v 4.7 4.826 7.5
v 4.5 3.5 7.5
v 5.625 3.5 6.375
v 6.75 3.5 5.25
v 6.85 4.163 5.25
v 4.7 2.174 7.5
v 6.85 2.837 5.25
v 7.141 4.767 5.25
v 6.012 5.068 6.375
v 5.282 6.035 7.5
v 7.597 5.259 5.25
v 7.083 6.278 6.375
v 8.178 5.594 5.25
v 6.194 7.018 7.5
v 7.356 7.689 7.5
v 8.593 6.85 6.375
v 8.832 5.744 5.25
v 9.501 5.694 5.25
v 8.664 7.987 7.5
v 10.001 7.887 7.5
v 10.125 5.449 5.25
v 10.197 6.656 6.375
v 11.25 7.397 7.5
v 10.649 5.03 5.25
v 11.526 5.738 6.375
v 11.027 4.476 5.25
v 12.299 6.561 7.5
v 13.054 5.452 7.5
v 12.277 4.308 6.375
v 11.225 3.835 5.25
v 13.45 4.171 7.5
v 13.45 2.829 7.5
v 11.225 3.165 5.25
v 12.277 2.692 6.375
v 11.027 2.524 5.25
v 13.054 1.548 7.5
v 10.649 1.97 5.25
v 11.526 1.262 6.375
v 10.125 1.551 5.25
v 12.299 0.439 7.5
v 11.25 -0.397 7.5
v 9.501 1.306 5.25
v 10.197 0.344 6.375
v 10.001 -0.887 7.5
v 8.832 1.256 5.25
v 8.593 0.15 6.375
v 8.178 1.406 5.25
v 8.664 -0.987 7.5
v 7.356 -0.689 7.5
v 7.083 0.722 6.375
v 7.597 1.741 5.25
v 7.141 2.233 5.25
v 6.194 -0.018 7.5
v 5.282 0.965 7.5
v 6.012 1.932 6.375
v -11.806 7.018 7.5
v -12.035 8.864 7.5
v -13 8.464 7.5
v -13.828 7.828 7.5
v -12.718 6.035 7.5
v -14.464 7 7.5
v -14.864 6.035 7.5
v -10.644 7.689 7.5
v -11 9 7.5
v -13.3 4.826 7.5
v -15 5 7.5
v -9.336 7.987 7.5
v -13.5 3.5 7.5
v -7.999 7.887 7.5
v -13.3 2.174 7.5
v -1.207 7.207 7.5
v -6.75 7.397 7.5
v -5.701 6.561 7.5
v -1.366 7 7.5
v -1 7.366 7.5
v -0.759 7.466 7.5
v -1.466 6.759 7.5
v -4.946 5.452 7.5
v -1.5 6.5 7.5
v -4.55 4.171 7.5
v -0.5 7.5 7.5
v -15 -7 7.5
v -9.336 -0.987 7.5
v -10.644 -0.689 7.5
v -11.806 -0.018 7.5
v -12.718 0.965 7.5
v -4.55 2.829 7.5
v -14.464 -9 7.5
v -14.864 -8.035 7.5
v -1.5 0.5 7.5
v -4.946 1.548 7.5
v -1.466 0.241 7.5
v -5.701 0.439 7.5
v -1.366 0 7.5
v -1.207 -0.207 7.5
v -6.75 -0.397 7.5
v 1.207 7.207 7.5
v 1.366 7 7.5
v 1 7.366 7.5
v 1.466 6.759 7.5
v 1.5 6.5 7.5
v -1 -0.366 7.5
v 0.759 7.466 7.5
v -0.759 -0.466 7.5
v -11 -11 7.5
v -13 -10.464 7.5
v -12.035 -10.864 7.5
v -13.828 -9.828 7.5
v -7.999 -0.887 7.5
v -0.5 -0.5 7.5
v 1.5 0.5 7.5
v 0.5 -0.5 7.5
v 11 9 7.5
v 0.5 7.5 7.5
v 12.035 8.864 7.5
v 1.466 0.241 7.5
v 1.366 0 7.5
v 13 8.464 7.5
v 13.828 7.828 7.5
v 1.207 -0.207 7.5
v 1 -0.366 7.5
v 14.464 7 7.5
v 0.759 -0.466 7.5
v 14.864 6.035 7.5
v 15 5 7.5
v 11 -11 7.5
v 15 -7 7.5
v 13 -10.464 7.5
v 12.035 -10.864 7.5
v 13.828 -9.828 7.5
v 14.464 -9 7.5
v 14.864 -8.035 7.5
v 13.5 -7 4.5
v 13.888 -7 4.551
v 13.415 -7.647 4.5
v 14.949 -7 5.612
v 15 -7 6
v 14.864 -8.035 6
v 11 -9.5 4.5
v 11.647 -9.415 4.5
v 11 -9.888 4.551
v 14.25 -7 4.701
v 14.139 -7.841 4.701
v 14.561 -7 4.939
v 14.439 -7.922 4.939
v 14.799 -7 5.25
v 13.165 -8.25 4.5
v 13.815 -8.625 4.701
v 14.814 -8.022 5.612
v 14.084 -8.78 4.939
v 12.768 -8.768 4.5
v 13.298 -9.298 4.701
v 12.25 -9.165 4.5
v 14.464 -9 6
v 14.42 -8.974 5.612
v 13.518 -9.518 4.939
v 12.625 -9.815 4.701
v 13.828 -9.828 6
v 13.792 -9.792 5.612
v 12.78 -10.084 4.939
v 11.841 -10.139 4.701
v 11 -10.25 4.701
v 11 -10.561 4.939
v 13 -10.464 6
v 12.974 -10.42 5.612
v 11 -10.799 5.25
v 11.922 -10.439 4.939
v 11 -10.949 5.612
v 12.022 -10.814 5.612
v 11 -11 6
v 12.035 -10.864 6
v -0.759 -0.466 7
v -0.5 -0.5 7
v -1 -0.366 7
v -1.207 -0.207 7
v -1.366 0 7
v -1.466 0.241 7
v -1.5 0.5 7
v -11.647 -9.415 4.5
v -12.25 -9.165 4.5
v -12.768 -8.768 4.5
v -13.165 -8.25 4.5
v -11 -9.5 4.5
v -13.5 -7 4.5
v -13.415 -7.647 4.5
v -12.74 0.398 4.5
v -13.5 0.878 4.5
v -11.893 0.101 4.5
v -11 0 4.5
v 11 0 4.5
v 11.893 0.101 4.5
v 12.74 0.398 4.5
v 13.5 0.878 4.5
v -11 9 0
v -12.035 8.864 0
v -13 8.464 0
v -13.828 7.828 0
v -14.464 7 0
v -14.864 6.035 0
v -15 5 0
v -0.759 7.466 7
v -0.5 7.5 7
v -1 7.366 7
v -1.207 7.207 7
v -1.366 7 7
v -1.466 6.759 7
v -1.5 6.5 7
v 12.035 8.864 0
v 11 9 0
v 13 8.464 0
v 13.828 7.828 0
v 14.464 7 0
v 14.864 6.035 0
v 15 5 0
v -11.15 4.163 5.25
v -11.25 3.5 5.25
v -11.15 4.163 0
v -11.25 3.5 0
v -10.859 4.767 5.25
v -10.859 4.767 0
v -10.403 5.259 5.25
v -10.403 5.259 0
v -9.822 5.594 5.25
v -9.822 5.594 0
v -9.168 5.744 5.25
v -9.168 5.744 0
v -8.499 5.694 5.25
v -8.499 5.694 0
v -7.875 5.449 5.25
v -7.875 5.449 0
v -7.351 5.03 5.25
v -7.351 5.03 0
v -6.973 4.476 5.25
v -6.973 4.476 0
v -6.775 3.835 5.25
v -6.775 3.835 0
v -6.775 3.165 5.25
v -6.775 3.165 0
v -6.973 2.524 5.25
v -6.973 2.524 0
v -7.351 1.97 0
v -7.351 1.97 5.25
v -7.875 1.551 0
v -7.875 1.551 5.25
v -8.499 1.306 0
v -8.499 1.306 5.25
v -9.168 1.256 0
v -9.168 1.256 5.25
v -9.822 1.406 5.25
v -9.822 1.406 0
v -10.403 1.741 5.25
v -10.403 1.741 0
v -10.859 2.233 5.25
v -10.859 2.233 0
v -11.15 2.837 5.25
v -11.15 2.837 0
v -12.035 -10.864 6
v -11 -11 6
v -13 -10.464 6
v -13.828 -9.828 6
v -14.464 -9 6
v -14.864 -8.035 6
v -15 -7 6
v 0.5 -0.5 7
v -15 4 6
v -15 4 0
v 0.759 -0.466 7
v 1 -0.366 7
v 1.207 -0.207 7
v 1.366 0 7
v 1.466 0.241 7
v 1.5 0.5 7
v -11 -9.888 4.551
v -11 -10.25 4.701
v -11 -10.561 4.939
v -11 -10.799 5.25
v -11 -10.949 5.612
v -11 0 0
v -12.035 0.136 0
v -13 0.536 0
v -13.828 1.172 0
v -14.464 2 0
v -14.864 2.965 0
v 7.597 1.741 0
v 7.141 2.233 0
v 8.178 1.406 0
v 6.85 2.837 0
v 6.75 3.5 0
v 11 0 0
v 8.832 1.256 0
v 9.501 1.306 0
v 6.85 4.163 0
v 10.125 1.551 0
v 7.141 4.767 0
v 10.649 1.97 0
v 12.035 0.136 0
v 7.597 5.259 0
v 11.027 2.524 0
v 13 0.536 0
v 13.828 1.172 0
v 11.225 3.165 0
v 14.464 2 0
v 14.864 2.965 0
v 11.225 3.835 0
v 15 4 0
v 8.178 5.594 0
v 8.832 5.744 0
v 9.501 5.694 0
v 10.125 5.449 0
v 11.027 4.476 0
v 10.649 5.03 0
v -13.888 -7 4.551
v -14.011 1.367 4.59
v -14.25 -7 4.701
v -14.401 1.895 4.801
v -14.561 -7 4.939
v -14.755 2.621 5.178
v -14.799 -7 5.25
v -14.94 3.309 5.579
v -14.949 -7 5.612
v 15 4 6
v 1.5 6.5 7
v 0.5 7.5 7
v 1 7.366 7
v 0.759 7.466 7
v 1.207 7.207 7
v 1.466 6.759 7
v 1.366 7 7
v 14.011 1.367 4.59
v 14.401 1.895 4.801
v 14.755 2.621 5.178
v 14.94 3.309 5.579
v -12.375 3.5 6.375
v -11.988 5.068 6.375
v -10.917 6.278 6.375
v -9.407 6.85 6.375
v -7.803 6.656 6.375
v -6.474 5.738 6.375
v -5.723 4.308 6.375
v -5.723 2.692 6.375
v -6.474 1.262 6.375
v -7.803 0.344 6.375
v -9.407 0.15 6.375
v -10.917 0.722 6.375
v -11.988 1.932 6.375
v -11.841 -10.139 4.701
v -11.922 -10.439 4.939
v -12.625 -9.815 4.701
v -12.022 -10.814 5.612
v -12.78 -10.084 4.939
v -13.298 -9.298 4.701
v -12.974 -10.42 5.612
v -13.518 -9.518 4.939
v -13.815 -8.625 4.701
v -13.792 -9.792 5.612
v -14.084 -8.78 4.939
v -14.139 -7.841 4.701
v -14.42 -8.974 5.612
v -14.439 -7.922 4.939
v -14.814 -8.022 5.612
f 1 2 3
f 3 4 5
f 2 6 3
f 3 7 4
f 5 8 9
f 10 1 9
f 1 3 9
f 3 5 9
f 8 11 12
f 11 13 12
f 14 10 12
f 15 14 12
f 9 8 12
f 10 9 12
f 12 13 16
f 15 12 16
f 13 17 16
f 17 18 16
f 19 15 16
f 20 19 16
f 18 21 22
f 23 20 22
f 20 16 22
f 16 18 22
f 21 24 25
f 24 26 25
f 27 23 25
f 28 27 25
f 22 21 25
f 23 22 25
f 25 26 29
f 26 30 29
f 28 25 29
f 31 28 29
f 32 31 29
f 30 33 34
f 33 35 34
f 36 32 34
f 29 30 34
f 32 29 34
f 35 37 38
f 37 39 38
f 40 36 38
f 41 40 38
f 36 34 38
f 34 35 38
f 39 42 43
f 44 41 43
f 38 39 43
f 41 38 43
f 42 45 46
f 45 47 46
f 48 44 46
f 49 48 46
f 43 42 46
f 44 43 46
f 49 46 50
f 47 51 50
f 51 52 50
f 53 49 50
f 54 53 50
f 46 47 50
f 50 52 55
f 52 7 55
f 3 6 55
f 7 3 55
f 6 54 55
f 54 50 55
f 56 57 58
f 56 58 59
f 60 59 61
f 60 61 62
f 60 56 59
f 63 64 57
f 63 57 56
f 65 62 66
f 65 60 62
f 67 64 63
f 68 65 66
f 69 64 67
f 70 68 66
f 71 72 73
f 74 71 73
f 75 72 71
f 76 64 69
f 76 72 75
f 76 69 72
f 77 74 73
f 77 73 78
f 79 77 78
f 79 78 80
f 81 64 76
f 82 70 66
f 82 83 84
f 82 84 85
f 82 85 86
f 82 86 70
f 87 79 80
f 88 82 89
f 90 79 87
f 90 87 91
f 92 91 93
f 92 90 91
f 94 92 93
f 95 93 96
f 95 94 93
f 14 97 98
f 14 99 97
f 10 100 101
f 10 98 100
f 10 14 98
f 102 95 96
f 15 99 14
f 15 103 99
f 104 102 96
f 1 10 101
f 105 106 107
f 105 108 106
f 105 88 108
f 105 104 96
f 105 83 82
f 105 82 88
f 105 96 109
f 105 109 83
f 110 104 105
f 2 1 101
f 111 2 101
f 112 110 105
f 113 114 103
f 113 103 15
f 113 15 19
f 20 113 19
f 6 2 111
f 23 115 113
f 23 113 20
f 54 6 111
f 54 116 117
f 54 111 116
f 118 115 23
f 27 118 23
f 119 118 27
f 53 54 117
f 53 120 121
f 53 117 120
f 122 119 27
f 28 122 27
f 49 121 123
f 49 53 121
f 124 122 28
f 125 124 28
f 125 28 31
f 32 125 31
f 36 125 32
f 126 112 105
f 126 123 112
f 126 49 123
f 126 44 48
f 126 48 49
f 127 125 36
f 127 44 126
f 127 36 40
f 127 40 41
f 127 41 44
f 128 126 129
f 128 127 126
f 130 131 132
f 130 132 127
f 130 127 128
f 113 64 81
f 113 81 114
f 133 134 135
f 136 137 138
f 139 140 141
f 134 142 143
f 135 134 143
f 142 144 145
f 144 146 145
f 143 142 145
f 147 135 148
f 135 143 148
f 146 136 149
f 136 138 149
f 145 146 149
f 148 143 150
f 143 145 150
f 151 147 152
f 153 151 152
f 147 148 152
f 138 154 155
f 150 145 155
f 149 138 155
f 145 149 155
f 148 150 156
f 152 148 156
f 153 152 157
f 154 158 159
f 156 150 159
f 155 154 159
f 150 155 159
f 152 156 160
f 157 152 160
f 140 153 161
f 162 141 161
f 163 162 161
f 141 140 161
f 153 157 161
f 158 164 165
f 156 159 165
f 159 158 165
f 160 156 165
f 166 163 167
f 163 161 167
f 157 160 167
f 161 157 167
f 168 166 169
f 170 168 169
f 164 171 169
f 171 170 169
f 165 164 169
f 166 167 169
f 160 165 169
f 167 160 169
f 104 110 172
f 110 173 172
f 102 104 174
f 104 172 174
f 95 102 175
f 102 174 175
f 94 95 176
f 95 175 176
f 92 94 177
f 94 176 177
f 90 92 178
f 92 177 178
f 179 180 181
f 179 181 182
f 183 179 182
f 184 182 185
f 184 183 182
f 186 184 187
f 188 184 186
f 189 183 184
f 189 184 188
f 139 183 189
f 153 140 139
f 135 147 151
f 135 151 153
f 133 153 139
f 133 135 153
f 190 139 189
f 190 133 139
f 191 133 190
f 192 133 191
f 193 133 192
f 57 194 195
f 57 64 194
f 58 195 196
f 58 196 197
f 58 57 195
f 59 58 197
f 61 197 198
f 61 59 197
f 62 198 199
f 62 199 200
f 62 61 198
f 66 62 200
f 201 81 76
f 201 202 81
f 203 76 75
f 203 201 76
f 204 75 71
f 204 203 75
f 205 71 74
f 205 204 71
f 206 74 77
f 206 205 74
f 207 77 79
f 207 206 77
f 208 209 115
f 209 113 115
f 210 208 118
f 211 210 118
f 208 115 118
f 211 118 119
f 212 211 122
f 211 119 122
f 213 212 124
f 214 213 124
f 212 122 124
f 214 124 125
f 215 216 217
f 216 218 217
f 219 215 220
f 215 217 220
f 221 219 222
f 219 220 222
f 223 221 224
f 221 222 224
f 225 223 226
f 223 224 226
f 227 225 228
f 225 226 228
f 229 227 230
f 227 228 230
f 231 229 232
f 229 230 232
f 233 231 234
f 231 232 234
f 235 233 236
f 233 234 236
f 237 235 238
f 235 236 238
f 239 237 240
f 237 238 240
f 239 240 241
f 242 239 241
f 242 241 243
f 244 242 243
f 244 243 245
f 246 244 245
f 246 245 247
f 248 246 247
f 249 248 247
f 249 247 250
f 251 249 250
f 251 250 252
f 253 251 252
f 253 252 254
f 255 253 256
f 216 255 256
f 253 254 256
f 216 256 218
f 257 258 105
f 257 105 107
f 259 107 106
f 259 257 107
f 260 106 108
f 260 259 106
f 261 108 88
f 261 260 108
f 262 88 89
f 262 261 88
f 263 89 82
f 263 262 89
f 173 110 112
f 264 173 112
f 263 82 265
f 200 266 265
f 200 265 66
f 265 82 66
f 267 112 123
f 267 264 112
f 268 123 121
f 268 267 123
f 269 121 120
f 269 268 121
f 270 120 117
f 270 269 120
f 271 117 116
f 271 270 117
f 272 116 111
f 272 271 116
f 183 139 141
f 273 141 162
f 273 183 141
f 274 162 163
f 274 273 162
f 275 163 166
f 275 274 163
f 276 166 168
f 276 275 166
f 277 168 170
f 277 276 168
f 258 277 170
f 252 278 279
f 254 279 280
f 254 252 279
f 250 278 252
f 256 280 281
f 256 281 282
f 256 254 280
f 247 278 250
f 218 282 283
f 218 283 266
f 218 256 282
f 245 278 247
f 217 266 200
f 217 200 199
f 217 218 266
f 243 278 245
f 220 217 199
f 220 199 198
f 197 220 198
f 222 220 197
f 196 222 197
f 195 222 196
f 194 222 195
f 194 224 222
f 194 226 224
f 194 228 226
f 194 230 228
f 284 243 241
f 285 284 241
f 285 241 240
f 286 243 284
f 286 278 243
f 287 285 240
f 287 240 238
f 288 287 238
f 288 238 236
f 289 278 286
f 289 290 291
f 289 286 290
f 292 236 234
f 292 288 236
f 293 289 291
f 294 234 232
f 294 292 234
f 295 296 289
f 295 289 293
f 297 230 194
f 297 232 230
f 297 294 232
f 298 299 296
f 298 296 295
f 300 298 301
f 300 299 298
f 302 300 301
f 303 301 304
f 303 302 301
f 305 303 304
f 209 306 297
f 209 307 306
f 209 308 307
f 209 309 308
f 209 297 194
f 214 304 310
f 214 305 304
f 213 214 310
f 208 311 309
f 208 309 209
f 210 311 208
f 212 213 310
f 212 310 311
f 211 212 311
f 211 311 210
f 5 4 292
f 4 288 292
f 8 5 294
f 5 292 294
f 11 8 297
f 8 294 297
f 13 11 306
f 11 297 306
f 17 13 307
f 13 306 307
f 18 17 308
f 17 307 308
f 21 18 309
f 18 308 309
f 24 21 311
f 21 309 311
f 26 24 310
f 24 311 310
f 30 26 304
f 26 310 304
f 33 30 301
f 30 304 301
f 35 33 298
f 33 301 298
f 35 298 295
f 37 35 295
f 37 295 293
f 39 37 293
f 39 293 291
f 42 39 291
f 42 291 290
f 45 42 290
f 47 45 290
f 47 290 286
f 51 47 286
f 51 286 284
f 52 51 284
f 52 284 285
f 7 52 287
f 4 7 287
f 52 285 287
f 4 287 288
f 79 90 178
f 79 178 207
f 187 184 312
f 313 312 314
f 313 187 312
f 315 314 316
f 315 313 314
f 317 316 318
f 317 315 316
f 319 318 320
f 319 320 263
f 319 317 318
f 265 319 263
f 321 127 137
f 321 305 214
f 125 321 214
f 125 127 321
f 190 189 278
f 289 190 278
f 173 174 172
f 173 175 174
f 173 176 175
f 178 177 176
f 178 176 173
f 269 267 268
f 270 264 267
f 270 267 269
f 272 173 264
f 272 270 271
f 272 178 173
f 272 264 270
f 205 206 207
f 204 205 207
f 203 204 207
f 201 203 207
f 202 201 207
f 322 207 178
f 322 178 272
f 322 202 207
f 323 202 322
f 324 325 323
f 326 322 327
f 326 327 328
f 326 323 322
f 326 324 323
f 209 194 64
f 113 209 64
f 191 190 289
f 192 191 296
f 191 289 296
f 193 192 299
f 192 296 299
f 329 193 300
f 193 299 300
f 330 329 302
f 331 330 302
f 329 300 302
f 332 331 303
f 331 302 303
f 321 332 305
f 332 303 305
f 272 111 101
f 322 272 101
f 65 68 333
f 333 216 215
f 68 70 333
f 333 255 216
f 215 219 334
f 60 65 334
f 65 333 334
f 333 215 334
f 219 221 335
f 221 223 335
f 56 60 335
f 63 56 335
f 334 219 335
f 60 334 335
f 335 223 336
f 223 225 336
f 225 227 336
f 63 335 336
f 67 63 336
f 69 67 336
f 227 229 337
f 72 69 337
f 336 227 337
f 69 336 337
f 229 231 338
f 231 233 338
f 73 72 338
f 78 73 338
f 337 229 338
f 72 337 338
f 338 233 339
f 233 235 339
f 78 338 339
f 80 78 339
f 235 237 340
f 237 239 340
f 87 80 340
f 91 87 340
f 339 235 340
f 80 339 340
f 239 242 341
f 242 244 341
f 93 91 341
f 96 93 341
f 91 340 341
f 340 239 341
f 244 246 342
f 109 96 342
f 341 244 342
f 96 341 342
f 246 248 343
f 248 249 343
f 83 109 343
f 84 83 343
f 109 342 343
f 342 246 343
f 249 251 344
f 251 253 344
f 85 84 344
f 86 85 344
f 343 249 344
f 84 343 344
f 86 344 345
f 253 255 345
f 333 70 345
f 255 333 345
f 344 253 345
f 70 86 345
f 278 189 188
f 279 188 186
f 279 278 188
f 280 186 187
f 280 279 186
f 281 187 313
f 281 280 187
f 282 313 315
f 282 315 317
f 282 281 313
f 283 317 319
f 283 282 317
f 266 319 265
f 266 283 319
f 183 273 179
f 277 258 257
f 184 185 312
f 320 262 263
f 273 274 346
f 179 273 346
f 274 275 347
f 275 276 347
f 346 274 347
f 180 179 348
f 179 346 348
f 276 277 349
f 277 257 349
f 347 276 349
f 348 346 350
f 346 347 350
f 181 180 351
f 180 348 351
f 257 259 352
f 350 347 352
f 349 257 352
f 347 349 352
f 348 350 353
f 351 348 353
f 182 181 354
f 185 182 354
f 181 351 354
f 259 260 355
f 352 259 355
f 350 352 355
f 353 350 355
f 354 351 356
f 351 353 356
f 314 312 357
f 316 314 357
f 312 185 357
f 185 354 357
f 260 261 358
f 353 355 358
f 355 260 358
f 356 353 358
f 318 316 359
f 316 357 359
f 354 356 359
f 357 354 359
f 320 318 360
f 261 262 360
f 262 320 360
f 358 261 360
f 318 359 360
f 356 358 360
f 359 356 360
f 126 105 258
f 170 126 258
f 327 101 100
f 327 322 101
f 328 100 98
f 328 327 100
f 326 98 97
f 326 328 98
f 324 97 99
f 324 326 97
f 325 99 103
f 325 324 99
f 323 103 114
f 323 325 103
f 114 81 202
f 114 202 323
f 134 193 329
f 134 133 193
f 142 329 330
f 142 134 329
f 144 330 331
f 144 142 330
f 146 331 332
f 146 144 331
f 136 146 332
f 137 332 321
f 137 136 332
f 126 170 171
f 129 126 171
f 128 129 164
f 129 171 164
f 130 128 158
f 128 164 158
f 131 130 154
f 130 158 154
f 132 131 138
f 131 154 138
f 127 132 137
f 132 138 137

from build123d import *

# Parameters (mm, degrees)
F1_DEPTH       = 15
F3_D           = 4.5
F3_CSINK_D     = 9
F3_CSINK_ANGLE = 90
F4_R           = 4
F5_R           = 1.5
F6_W           = 3
F6_H           = 8
F7_DEPTH       = 0.5
F8_R           = 1


with BuildPart() as f1:
    # F0 (on Right) → F1 (new body, symmetric)
    with BuildSketch(Plane.YZ):
        Polygon((0, 4.5), (0, 0), (9, 0), (9, 7.5), (-11, 7.5), (-11, 4.5), align=None)
    extrude(amount=F1_DEPTH, both=True)

    # F3 (through all)
    with Locations(Plane.XY.offset(7.5)):
        with Locations((-9, 3.5), (9, 3.5)):
            CounterSinkHole(F3_D / 2, F3_CSINK_D / 2, counter_sink_angle=F3_CSINK_ANGLE)

    # F4
    f4_edges = [f1.edges().sort_by_distance(p)[0] for p in [
        (15, -11, 6),
        (-15, -11, 6),
        (15, 0, 2.25),
        (-15, 0, 2.25),
        (-15, 9, 3.75),
        (15, 9, 3.75),
    ]]
    fillet(f4_edges, radius=F4_R)

    # F5
    f5_edges = [f1.edges().sort_by_distance(p)[0] for p in [
        (-15, -3.5, 4.5),
    ]]
    fillet(f5_edges, radius=F5_R)

    # F6 (on face) → F7 (cut)
    with BuildSketch(Plane.XY.offset(7.5)):
        with Locations((0, 3.5)):
            Rectangle(F6_W, F6_H)
    extrude(amount=-F7_DEPTH, mode=Mode.SUBTRACT)

    # F8
    f8_edges = [f1.edges().sort_by_distance(p)[0] for p in [
        (-1.5, 7.5, 7.25),
        (-1.5, -0.5, 7.25),
        (1.5, -0.5, 7.25),
        (1.5, 7.5, 7.25),
    ]]
    fillet(f8_edges, radius=F8_R)


solid = f1.part
